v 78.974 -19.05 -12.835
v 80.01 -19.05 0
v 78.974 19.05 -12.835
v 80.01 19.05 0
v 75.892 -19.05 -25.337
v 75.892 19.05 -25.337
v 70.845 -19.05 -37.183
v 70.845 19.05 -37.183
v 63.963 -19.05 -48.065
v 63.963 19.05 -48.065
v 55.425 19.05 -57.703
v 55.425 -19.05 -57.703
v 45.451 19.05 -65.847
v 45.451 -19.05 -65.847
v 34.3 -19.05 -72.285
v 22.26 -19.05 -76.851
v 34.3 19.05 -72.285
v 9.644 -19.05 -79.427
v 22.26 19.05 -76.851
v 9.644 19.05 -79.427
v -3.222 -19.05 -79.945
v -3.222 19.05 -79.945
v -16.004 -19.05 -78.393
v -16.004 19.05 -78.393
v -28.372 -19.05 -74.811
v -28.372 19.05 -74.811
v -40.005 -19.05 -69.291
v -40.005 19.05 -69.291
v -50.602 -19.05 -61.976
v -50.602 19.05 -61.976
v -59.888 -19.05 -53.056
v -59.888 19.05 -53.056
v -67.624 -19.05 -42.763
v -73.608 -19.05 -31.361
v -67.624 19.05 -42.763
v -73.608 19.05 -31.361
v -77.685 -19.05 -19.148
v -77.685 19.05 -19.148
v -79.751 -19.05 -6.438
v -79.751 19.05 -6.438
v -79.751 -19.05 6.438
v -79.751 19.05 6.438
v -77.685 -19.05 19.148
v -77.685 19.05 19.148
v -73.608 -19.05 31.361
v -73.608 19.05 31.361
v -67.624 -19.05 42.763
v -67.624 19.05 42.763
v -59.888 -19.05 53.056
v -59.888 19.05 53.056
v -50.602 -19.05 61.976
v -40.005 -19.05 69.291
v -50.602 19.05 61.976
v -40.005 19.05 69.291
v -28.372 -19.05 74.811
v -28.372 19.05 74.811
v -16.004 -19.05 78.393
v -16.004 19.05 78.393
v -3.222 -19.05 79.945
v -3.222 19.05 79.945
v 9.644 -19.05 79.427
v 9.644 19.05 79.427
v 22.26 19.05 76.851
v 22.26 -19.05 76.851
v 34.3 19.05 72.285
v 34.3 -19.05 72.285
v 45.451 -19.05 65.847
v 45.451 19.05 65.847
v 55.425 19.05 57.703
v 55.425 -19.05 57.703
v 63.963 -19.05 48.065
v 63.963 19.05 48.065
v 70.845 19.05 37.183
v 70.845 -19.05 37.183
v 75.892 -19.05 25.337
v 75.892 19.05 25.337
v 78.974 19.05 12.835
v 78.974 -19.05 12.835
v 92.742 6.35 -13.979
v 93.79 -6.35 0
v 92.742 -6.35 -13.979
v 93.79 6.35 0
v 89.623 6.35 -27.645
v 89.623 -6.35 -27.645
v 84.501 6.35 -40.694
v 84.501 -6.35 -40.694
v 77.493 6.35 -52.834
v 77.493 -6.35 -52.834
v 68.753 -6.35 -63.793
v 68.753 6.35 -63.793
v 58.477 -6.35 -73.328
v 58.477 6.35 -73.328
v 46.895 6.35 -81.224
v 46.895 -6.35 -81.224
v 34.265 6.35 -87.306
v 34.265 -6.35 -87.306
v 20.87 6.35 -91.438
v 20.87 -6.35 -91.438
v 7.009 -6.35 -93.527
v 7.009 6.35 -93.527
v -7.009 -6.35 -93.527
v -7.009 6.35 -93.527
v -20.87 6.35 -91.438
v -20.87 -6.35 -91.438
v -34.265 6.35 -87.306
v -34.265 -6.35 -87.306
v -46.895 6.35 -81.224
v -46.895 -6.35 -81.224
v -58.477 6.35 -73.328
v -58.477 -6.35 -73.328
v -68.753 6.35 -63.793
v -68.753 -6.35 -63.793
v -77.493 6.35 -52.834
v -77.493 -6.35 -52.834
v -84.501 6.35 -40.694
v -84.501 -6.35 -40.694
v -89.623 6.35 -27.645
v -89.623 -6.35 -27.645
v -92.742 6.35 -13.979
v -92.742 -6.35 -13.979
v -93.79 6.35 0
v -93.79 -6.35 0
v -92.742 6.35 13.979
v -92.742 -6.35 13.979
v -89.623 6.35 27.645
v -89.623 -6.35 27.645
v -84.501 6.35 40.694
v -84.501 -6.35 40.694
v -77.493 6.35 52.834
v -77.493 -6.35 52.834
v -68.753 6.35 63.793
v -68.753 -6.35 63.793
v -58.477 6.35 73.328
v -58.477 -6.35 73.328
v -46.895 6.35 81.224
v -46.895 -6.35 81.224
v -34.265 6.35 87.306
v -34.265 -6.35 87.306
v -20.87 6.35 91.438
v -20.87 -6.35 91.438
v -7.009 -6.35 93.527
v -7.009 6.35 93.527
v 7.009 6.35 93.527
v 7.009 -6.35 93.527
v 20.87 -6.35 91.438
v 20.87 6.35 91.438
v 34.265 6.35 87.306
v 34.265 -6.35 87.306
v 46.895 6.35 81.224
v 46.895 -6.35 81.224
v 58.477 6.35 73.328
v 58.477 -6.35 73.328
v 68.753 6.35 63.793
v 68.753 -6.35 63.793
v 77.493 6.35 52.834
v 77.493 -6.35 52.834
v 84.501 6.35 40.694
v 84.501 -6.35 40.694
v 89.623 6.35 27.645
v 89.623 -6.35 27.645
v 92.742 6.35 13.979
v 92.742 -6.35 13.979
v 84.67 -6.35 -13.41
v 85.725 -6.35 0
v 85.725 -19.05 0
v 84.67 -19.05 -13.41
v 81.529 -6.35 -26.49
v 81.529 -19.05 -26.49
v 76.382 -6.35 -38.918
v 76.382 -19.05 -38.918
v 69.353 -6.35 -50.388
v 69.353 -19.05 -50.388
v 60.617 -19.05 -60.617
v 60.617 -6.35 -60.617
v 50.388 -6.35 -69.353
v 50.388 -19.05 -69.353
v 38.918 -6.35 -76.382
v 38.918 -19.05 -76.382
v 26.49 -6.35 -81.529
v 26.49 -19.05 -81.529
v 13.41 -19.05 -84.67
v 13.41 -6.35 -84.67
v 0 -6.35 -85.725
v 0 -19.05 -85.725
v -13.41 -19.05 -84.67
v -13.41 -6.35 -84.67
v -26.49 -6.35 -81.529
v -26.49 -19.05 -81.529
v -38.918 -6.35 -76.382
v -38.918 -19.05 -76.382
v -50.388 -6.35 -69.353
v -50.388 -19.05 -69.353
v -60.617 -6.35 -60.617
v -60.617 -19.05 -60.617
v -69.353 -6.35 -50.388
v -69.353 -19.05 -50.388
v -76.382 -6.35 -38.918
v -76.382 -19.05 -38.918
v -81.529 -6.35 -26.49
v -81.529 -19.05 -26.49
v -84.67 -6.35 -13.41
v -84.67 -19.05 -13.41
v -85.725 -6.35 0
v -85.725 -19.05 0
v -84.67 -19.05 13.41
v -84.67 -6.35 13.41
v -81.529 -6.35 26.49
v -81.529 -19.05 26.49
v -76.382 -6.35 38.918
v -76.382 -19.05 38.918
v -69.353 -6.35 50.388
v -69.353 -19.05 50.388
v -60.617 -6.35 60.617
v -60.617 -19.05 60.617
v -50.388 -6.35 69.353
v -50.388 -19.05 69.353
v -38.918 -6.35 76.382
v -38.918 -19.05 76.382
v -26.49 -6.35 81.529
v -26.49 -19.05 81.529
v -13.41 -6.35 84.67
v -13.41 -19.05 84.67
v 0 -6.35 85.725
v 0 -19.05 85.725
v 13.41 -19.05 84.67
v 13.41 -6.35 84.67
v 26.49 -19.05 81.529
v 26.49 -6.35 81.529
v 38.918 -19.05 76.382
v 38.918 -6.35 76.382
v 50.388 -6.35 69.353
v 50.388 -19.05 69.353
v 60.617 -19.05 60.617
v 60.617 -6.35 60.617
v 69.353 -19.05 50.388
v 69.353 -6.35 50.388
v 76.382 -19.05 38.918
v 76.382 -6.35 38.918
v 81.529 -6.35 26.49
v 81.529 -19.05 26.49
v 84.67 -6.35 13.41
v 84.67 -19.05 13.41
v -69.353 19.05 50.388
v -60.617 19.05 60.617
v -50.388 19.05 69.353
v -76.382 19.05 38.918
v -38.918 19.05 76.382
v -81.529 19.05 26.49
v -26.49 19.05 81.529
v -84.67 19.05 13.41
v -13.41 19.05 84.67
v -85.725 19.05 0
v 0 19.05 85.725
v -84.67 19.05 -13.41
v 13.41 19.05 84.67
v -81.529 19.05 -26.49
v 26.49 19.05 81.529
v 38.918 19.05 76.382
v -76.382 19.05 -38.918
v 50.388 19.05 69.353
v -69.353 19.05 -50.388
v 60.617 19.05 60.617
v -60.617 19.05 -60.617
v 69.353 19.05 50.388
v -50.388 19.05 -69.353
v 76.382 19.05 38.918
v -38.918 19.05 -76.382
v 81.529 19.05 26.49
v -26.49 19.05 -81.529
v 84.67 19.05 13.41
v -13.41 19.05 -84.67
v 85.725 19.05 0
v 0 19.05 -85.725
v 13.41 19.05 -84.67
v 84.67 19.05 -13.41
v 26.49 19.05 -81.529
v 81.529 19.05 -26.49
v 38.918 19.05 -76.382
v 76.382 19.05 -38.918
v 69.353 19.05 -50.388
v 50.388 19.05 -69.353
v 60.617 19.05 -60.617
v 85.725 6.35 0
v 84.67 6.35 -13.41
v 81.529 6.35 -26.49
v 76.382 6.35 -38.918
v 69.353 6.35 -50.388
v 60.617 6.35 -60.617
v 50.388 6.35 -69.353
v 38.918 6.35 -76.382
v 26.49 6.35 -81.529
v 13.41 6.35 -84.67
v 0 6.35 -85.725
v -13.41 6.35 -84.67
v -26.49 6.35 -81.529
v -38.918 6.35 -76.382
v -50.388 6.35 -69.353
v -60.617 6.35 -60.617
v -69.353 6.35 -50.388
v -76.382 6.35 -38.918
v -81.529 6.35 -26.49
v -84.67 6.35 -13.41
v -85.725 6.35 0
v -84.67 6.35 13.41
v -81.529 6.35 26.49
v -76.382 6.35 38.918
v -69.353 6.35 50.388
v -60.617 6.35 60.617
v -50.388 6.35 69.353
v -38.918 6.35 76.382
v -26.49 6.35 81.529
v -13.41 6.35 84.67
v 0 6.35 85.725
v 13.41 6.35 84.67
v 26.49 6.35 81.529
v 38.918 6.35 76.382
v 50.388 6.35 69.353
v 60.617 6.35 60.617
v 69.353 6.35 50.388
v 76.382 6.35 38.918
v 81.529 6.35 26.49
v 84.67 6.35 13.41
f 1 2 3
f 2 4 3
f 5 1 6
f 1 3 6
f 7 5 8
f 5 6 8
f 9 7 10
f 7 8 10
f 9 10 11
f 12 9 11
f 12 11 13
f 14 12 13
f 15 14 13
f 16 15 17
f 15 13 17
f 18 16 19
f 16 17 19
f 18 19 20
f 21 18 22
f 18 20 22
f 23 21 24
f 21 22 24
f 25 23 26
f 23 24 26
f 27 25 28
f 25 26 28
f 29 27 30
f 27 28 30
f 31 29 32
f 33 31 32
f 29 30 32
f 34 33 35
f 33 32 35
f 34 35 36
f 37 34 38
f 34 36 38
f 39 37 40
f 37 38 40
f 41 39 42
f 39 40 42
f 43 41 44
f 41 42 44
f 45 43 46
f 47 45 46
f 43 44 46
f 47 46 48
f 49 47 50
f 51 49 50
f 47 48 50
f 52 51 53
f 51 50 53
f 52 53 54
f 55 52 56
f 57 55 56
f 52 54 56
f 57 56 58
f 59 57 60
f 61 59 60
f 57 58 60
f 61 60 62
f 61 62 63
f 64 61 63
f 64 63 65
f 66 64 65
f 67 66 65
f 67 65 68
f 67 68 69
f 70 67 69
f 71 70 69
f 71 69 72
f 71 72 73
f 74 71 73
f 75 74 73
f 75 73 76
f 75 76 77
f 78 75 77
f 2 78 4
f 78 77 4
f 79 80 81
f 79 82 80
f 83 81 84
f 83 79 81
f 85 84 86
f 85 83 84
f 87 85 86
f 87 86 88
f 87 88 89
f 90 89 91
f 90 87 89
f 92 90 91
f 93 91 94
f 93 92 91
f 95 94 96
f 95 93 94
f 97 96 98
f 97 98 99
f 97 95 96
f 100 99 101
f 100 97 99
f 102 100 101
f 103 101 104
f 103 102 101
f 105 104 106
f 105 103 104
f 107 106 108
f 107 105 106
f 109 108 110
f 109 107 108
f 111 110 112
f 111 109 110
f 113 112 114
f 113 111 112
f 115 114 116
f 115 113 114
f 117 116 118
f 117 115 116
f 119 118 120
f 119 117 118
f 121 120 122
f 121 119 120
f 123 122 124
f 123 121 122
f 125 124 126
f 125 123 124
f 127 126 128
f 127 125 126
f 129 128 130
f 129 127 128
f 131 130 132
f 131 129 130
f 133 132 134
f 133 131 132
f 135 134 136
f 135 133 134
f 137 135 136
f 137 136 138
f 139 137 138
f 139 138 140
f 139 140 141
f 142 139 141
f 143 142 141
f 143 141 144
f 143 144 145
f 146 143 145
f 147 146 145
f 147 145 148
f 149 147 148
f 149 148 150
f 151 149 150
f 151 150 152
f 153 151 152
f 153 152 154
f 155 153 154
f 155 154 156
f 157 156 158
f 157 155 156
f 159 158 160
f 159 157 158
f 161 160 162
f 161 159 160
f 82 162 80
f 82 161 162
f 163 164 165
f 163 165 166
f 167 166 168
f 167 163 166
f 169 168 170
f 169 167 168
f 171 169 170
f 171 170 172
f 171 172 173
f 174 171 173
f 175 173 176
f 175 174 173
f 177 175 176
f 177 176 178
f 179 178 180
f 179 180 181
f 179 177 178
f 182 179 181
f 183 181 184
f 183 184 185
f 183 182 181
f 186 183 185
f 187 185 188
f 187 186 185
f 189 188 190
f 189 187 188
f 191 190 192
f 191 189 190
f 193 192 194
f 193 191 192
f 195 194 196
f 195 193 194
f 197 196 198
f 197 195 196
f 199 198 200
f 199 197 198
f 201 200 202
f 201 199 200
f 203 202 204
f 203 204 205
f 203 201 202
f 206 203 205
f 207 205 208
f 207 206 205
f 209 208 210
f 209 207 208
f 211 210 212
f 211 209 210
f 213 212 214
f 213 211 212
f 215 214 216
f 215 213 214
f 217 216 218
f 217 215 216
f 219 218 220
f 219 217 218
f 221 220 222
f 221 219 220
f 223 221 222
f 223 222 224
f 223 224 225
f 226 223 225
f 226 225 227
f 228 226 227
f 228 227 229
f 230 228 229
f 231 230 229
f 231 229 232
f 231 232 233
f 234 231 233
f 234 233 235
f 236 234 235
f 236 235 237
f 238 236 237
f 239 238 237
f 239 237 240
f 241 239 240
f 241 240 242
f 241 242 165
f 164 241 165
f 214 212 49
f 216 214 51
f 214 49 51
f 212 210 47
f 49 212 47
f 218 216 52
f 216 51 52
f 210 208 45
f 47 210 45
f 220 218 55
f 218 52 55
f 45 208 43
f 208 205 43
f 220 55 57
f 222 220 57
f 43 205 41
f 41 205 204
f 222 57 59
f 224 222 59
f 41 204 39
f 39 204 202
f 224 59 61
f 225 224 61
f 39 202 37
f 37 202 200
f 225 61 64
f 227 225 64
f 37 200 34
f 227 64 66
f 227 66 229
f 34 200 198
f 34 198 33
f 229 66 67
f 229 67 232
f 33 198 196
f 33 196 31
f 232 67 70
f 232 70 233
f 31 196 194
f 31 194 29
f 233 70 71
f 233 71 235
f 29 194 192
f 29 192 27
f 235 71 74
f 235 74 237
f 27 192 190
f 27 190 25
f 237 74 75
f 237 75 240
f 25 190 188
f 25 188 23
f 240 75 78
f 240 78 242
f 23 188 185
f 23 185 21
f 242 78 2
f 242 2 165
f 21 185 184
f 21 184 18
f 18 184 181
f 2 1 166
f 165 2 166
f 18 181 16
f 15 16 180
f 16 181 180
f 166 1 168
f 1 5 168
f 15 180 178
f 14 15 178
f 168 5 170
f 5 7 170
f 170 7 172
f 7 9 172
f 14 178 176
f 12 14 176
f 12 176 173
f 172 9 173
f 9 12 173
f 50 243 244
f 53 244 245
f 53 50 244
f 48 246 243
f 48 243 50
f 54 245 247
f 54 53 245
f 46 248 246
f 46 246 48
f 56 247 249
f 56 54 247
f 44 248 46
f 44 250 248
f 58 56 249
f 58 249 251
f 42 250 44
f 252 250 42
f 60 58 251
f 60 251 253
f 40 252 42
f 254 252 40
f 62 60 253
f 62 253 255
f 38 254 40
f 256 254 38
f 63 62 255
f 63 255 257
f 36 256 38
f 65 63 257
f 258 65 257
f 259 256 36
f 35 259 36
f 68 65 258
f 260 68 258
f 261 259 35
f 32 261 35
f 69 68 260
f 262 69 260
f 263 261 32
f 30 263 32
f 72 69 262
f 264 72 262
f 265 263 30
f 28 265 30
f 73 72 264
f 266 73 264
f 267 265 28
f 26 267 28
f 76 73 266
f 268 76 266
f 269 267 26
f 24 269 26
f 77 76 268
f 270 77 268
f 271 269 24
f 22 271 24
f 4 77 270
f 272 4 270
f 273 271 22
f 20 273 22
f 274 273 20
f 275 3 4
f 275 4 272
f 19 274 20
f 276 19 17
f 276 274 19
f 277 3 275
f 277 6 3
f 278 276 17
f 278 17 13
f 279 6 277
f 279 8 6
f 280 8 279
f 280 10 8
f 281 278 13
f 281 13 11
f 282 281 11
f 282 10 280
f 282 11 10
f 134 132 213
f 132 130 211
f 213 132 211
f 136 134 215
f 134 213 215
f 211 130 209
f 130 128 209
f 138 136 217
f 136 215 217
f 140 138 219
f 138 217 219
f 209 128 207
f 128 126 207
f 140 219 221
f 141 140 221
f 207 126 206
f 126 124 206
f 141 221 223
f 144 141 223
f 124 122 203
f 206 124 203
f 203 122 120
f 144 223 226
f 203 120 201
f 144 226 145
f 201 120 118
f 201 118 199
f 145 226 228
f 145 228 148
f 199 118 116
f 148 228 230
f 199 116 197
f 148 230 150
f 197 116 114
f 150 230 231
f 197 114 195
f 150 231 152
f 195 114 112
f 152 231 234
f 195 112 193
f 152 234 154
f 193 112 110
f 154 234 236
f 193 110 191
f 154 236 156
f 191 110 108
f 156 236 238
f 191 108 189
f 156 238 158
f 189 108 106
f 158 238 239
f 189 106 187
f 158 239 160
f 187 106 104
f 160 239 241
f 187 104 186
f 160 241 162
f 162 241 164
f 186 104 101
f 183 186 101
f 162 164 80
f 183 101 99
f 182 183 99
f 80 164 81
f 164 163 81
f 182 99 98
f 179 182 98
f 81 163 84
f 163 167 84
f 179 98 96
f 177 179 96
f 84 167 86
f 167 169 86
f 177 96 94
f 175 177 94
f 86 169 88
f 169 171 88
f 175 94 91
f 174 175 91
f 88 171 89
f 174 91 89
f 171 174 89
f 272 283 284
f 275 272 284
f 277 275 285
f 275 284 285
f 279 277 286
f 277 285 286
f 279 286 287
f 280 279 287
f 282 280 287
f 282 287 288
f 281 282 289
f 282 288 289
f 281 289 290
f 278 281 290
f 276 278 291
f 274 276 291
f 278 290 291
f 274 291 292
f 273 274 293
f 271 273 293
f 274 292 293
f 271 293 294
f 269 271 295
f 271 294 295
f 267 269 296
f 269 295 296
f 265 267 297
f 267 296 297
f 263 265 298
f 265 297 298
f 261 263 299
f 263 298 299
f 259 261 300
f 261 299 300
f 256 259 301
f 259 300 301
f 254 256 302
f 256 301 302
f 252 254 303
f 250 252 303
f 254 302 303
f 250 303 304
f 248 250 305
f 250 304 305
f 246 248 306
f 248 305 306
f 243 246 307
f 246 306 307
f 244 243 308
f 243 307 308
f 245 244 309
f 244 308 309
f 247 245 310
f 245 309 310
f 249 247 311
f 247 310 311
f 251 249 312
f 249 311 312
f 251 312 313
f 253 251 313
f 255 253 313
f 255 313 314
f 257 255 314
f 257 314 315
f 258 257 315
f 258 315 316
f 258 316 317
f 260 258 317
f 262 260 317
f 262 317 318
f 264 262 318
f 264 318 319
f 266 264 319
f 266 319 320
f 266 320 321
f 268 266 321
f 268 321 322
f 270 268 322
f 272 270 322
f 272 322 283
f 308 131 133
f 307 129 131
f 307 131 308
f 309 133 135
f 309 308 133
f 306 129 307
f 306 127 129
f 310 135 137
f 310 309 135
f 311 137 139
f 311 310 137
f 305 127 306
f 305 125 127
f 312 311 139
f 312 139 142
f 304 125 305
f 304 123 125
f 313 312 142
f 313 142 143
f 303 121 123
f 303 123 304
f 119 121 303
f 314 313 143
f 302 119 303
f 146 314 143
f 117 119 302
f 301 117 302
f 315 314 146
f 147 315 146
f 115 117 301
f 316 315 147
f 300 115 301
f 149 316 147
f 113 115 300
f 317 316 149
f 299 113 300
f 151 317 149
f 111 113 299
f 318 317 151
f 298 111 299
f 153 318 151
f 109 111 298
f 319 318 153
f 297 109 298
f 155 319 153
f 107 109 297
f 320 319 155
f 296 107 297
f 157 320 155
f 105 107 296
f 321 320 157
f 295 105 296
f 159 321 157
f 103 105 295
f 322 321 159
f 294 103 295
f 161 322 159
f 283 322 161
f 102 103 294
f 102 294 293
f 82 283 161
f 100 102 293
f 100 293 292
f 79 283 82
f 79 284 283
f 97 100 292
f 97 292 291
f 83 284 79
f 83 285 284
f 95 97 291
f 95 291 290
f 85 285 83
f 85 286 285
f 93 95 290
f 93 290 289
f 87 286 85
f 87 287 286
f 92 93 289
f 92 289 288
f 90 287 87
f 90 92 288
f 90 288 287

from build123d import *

# Parameters (mm, degrees)
SKETCH1_R           = 93.7895
SKETCH1_R_2         = 80.01
BOSS_EXTRUDE1_DEPTH = 6.35
SKETCH3_R           = 85.725
SKETCH3_R_2         = 80.01
BOSS_EXTRUDE2_DEPTH = 12.7


with BuildPart() as part:
    # Sketch1 → Boss-Extrude1 (new body, symmetric)
    with BuildSketch(Plane(origin=(0, 0, 0), x_dir=(1, 0, 0), z_dir=(0, 1, 0))):
        Circle(SKETCH1_R)
        Circle(SKETCH1_R_2, mode=Mode.SUBTRACT)
    extrude(amount=BOSS_EXTRUDE1_DEPTH, both=True)

    # Sketch3 → Boss-Extrude2 (add)
    with BuildSketch(Plane(origin=(0, 6.35, 0), x_dir=(1, 0, 0), z_dir=(0, 1, 0))):
        Circle(SKETCH3_R)
        Circle(SKETCH3_R_2, mode=Mode.SUBTRACT)
    boss_extrude2 = extrude(amount=BOSS_EXTRUDE2_DEPTH)

    # Mirror2: Boss-Extrude2 across plane
    add(boss_extrude2.mirror(Plane.ZX))


solid = part.part
